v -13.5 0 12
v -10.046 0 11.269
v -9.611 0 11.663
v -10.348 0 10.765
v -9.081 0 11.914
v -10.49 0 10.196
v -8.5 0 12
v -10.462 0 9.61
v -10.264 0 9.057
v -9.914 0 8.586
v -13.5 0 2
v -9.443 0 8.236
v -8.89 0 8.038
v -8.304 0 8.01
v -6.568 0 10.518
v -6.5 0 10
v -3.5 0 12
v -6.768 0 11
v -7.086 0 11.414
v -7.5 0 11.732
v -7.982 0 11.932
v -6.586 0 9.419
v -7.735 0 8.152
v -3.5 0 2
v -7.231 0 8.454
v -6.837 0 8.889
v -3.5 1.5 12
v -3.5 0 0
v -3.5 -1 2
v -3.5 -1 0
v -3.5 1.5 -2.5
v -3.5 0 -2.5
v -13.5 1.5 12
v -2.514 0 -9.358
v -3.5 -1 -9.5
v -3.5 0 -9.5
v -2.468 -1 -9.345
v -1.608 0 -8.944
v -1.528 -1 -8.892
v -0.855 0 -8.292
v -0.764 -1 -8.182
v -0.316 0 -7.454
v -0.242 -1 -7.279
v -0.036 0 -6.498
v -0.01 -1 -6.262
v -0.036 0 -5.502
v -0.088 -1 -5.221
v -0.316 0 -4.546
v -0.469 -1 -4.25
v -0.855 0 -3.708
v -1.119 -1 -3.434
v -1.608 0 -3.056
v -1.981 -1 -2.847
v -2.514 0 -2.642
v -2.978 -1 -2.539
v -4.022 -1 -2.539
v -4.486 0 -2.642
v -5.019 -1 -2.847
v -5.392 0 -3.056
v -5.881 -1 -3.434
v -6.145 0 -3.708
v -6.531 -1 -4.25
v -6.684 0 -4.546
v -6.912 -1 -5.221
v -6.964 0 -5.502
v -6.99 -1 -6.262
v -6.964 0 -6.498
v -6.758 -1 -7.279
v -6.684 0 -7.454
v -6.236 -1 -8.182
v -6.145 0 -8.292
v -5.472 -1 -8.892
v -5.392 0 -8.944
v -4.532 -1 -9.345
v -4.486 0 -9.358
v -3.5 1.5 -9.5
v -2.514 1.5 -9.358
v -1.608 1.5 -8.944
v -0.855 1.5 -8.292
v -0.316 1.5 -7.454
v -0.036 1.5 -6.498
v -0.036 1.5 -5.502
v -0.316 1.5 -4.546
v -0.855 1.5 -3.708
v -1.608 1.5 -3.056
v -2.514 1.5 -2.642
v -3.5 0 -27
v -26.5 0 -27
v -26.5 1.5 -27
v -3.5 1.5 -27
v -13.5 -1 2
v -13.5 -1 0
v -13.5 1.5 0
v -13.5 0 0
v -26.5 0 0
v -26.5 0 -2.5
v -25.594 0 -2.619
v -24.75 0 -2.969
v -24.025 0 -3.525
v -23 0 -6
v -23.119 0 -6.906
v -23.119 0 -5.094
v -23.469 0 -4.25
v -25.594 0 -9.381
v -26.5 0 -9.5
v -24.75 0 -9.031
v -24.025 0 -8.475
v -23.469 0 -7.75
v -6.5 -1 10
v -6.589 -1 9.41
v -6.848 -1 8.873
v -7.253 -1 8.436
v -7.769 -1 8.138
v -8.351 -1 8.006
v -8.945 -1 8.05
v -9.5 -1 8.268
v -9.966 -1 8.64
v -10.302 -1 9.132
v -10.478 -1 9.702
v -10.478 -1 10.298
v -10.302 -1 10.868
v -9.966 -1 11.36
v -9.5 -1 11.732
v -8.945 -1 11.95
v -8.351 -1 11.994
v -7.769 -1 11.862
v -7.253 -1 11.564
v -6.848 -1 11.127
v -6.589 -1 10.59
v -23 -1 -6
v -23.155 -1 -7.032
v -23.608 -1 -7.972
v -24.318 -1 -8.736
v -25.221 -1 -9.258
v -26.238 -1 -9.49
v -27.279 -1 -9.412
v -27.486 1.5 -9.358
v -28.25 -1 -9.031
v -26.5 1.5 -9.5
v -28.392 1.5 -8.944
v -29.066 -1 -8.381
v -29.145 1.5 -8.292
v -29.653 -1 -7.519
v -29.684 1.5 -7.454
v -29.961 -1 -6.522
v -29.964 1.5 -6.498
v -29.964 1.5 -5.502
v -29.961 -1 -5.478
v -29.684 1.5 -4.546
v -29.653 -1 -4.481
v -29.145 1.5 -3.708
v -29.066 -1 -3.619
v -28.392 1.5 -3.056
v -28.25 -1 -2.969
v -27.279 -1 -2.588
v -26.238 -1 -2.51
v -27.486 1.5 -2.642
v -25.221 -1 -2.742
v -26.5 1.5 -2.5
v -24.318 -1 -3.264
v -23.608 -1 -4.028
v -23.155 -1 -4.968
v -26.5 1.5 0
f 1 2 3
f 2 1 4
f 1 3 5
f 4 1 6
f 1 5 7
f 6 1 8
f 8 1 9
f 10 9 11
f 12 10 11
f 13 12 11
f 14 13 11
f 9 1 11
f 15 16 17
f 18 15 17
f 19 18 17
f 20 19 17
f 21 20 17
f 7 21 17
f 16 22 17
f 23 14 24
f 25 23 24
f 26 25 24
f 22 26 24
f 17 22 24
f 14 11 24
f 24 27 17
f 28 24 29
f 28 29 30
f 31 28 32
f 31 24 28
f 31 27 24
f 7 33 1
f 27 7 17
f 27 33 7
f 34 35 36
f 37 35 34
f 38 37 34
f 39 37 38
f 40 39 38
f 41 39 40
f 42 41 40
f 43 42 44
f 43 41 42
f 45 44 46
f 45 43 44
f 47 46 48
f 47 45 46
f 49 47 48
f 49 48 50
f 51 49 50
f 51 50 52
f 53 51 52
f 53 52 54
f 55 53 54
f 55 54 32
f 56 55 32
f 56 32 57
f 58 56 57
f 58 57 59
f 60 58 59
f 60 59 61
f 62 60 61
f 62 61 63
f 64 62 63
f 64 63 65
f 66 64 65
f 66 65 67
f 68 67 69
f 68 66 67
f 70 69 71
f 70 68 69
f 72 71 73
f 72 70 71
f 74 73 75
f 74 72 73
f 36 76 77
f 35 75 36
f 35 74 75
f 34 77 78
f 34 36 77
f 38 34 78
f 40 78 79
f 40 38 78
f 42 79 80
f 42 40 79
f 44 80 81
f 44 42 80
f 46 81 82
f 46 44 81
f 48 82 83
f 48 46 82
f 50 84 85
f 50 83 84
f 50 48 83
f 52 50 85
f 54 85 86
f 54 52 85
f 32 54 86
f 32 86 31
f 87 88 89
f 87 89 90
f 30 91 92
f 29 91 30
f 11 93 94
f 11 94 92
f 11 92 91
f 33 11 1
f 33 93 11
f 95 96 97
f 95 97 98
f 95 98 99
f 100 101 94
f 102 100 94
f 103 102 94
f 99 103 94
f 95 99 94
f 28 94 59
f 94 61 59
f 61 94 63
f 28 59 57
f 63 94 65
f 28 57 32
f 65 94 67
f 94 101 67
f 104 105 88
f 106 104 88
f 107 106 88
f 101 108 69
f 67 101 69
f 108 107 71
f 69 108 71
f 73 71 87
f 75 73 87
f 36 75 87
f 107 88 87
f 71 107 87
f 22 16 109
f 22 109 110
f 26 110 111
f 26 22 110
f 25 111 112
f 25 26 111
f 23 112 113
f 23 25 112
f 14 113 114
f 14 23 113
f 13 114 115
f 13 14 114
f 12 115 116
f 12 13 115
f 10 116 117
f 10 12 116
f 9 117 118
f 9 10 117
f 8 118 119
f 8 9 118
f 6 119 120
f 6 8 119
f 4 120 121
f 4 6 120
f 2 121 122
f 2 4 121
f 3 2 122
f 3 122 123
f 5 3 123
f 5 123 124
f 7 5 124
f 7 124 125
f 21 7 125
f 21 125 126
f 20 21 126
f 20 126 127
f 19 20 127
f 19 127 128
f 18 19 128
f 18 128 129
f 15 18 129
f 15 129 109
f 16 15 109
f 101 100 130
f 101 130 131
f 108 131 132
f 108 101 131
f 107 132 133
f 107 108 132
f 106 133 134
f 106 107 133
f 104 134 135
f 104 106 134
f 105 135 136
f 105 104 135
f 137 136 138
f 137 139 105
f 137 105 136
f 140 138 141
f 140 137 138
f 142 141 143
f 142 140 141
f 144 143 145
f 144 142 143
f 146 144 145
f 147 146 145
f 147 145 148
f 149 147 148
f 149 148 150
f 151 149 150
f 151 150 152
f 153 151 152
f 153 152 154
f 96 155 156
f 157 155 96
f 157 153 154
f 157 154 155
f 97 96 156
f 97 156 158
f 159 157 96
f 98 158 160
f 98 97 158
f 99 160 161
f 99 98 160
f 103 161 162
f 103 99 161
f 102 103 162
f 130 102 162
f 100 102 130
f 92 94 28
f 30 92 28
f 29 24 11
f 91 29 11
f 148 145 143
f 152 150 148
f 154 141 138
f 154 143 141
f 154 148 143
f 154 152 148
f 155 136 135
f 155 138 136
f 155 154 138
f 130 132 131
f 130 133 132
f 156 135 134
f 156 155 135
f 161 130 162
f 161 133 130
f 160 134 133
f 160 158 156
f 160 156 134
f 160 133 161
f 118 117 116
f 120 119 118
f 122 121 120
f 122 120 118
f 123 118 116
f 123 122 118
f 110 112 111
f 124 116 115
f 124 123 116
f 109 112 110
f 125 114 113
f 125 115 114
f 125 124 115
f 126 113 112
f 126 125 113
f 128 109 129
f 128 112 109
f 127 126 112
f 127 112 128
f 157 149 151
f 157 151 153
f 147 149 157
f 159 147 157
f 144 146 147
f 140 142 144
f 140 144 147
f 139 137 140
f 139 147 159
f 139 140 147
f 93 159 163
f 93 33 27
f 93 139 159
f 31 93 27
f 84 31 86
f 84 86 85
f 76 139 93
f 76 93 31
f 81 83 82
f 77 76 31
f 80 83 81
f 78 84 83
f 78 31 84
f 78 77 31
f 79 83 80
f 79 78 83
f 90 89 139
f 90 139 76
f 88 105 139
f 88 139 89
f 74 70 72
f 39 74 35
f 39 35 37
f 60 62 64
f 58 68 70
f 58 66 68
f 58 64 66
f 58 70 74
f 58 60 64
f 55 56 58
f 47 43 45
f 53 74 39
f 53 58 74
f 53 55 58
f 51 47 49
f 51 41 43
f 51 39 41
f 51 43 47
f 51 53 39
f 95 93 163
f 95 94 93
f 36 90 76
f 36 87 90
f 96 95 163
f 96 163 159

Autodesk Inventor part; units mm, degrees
ref_plane "YZ Plane" through (0, 0, 0) normal (1, 0, 0) x (0, 1, 0)
ref_plane "XZ Plane" through (0, 0, 0) normal (0, 1, 0) x (-1, 0, 0)
ref_plane "XY Plane" through (0, 0, 0) normal (0, 0, 1) x (1, 0, 0)
sketch "スケッチ1" plane through (0, 0, 0) normal (0, 1, 0) x (-1, 0, 0)
  line L0 (0, 0) -> (30, 0)
  line L1 (30, 0) -> (30, -27)
  line L2 (30, -27) -> (0, -27)
  line L3 (0, -27) -> (0, 0)
  circle A0 centre (26.5, -6) radius 3.5
  circle A1 centre (3.5, -6) radius 3.5
  line L4 (26.5, 0) -> (26.5, -27)
  line L5 (3.5, -27) -> (3.5, 0)
  point P0 (26.5, -9.5)
  point P1 (26.5, -2.5)
  point P2 (3.5, -2.5)
  point P3 (3.5, -9.5)
  dimension "d0" = 30
  dimension "d1" = 27
  dimension "d2" = 7
  dimension "d3" = 7
  dimension "d4" = 6
extrude "押し出し1" add sketch "スケッチ1" along normal blind 1.5 contours L0 L4 A0 L2 L5 A1 | A1 L5 | A1 L5 | L4 A0 | A0 L4
sketch "スケッチ2" plane through (0, 1.5, 0) normal (0, 1, 0) x (1, 0, 0)
  line L0 (-3.5, 0) -> (-13.5, 0)
  line L1 (-13.5, 0) -> (-13.5, -12)
  line L2 (-13.5, -12) -> (-3.5, -12)
  line L3 (-3.5, -12) -> (-3.5, 0)
  line L4 (-3.5, 0) -> (-3.5, 2.5) projected
  point P0 (0, 0)
  dimension "d7" = 10
  dimension "d8" = 12
extrude "押し出し2" add sketch "スケッチ2" against normal up to surface (1.5 mm away)
sketch "スケッチ3" plane through (0, 0, 0) normal (0, -1, 0) x (1, 0, 0)
  arc A0 (-26.5, -2.5) -> (-26.5, -9.5) centre (-26.5, -6) ccw projected
  arc A1 (-3.5, -9.5) -> (-3.5, -2.5) centre (-3.5, -6) ccw projected
  line L0 (-26.5, 0) -> (-13.5, 0) projected
  line L1 (-13.5, 0) -> (-3.5, 0)
  line L2 (-3.5, 0) -> (-3.5, 2)
  line L3 (-3.5, 2) -> (-13.5, 2)
  line L4 (-13.5, 2) -> (-13.5, 0)
  line L5 (-3.5, -2.5) -> (-3.5, 12) projected
  circle A2 centre (-26.5, -6) radius 3.5
  circle A3 centre (-3.5, -6) radius 3.5
  point P0 (0, 0)
  point P1 (-3.5, -2.5)
  point P2 (-26.5, -9.5)
  dimension "d11" = 2
extrude "押し出し3" add sketch "スケッチ3" along normal blind 1
sketch "スケッチ4" plane through (0, 0, 0) normal (0, -1, 0) x (1, 0, 0)
  circle A0 centre (-8.5, 10) radius 2
  line L0 (-3.5, 12) -> (-13.5, 12) projected
  point P0 (0, 0)
  point P1 (-8.5, 12)
  dimension "d14" = 4
extrude "押し出し4" add sketch "スケッチ4" along normal blind 1
properties part number "type_A_ver2"
